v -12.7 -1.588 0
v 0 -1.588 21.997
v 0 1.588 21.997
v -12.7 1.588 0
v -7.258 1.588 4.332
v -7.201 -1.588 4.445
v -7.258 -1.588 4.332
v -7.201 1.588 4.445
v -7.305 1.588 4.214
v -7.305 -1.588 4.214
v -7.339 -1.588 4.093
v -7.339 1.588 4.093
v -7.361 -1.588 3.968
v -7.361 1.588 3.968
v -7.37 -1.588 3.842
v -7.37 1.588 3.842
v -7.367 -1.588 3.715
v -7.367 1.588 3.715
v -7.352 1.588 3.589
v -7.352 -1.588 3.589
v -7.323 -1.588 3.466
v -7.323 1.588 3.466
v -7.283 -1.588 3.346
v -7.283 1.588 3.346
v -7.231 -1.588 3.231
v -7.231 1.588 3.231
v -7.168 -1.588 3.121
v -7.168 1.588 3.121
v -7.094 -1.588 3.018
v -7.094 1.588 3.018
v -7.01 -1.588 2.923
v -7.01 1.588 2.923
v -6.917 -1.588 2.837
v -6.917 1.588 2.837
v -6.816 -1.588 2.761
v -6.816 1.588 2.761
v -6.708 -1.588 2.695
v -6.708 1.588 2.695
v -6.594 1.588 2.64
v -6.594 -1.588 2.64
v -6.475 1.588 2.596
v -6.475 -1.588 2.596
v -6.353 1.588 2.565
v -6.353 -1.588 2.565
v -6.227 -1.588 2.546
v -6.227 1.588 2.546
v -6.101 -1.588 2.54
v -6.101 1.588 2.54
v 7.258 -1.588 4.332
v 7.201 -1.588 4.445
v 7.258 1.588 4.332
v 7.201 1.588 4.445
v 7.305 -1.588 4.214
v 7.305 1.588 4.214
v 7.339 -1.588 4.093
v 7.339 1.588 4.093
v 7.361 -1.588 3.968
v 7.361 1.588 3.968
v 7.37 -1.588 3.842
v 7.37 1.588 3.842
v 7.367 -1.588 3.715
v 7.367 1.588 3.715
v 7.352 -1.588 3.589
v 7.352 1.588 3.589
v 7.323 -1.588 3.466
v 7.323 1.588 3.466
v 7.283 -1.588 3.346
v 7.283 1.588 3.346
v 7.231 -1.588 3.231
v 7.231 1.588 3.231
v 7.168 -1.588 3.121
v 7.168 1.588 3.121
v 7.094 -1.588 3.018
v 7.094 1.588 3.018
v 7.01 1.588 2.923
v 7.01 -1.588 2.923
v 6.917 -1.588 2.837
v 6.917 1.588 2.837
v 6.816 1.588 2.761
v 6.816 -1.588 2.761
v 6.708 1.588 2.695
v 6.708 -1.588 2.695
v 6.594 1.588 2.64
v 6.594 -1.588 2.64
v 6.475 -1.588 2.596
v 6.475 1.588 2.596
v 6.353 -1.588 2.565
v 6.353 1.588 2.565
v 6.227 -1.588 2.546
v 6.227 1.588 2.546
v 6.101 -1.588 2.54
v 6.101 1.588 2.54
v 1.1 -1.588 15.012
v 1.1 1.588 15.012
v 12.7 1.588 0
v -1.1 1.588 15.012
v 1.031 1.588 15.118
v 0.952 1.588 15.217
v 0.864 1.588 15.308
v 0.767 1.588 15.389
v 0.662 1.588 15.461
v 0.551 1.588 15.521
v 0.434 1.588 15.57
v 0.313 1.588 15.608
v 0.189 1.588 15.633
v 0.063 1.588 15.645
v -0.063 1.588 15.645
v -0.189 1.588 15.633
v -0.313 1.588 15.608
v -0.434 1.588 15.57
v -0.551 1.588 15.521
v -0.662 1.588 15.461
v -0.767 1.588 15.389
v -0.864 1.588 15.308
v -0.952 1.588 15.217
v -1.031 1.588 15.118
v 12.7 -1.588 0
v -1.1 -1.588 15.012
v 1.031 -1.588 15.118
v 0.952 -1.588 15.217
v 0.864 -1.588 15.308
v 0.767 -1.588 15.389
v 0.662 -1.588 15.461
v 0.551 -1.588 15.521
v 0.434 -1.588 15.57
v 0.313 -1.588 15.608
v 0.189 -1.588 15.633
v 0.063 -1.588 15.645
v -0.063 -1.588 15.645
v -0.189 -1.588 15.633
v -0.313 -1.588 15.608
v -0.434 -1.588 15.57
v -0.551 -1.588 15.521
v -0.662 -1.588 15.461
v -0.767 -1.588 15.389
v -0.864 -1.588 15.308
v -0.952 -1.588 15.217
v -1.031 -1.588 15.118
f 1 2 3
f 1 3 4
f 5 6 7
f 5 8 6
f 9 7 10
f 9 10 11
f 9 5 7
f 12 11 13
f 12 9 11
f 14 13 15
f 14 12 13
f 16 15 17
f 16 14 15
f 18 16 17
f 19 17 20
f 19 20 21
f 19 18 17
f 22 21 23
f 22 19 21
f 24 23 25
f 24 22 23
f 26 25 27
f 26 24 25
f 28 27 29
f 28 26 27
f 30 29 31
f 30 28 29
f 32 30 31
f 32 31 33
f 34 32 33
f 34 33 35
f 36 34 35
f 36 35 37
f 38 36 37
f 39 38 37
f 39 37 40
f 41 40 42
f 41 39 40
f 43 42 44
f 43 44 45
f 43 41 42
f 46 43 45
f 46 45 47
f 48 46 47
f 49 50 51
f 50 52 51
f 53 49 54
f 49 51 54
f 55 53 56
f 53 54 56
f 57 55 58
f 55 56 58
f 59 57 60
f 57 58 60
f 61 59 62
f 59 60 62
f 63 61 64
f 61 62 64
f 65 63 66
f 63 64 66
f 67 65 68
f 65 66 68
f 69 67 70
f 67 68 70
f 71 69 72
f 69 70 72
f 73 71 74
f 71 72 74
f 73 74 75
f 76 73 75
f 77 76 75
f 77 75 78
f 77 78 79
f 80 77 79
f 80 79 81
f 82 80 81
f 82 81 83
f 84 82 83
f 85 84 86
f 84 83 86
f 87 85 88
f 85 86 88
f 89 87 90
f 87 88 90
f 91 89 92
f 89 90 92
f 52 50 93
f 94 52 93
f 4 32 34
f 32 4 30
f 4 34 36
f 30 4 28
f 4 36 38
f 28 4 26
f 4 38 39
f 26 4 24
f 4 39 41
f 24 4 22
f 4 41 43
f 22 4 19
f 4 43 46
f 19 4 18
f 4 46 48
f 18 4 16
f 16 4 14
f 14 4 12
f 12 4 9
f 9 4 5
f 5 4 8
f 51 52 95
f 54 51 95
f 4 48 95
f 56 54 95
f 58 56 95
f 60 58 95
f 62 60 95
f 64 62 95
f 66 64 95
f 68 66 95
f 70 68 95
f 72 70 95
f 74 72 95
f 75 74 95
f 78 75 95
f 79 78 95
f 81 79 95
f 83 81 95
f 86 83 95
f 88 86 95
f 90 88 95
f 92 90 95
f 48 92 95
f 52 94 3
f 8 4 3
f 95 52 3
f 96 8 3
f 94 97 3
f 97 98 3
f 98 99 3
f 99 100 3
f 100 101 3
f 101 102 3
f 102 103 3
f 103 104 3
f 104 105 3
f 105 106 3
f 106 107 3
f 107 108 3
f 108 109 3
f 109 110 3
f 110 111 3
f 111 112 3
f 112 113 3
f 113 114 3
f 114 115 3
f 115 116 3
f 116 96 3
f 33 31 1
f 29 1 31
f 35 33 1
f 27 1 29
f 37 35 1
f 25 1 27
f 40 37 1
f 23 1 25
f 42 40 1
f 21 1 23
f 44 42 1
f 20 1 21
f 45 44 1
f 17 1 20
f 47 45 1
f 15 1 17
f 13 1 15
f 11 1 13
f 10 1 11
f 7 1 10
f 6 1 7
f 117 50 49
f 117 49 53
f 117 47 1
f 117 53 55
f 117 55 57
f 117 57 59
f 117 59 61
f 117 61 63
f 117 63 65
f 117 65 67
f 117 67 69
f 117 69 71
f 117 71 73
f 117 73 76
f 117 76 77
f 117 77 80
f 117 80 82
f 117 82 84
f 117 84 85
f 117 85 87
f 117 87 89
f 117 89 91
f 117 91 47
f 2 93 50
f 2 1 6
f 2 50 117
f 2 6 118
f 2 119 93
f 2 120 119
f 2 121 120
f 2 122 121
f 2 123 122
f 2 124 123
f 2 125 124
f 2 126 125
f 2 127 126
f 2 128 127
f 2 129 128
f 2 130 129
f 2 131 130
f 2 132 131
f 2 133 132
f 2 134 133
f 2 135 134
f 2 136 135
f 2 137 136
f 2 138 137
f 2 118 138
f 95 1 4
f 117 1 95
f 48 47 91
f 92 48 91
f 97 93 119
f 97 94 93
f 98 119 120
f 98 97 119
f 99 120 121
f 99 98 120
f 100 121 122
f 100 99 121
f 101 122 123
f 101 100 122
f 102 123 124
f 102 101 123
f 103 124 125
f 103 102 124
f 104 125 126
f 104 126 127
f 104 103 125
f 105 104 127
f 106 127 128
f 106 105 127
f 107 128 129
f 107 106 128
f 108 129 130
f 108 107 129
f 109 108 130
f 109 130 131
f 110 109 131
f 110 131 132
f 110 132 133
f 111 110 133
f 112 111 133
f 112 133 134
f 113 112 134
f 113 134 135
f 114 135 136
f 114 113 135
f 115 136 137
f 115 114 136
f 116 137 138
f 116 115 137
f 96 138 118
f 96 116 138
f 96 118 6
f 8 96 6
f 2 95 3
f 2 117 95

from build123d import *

# Parameters (mm, degrees)
F1_DEPTH = 1.5875
F3_DEPTH = 3.176
F4_R     = 1.27


with BuildPart() as f1:
    # F0 (on Front) → F1 (new body, symmetric)
    with BuildSketch(Plane.XZ):
        Polygon((12.7, 0), (0, 21.997045), (-12.7, 0), align=None)
    extrude(amount=F1_DEPTH, both=True)

    # F2 (on face) → F3 (cut, through all)
    with BuildSketch(Plane.XZ.offset(1.5875)):
        Polygon((8.300591, 2.54), (0, 16.917045), (-8.300591, 2.54), align=None)
    extrude(amount=-F3_DEPTH, mode=Mode.SUBTRACT)

    # F4
    f4_edges = [f1.edges().sort_by_distance(p)[0] for p in [
        (0, 0, 16.917045),
        (8.300591, 0, 2.54),
        (-8.300591, 0, 2.54),
    ]]
    fillet(f4_edges, radius=F4_R)


solid = f1.part
